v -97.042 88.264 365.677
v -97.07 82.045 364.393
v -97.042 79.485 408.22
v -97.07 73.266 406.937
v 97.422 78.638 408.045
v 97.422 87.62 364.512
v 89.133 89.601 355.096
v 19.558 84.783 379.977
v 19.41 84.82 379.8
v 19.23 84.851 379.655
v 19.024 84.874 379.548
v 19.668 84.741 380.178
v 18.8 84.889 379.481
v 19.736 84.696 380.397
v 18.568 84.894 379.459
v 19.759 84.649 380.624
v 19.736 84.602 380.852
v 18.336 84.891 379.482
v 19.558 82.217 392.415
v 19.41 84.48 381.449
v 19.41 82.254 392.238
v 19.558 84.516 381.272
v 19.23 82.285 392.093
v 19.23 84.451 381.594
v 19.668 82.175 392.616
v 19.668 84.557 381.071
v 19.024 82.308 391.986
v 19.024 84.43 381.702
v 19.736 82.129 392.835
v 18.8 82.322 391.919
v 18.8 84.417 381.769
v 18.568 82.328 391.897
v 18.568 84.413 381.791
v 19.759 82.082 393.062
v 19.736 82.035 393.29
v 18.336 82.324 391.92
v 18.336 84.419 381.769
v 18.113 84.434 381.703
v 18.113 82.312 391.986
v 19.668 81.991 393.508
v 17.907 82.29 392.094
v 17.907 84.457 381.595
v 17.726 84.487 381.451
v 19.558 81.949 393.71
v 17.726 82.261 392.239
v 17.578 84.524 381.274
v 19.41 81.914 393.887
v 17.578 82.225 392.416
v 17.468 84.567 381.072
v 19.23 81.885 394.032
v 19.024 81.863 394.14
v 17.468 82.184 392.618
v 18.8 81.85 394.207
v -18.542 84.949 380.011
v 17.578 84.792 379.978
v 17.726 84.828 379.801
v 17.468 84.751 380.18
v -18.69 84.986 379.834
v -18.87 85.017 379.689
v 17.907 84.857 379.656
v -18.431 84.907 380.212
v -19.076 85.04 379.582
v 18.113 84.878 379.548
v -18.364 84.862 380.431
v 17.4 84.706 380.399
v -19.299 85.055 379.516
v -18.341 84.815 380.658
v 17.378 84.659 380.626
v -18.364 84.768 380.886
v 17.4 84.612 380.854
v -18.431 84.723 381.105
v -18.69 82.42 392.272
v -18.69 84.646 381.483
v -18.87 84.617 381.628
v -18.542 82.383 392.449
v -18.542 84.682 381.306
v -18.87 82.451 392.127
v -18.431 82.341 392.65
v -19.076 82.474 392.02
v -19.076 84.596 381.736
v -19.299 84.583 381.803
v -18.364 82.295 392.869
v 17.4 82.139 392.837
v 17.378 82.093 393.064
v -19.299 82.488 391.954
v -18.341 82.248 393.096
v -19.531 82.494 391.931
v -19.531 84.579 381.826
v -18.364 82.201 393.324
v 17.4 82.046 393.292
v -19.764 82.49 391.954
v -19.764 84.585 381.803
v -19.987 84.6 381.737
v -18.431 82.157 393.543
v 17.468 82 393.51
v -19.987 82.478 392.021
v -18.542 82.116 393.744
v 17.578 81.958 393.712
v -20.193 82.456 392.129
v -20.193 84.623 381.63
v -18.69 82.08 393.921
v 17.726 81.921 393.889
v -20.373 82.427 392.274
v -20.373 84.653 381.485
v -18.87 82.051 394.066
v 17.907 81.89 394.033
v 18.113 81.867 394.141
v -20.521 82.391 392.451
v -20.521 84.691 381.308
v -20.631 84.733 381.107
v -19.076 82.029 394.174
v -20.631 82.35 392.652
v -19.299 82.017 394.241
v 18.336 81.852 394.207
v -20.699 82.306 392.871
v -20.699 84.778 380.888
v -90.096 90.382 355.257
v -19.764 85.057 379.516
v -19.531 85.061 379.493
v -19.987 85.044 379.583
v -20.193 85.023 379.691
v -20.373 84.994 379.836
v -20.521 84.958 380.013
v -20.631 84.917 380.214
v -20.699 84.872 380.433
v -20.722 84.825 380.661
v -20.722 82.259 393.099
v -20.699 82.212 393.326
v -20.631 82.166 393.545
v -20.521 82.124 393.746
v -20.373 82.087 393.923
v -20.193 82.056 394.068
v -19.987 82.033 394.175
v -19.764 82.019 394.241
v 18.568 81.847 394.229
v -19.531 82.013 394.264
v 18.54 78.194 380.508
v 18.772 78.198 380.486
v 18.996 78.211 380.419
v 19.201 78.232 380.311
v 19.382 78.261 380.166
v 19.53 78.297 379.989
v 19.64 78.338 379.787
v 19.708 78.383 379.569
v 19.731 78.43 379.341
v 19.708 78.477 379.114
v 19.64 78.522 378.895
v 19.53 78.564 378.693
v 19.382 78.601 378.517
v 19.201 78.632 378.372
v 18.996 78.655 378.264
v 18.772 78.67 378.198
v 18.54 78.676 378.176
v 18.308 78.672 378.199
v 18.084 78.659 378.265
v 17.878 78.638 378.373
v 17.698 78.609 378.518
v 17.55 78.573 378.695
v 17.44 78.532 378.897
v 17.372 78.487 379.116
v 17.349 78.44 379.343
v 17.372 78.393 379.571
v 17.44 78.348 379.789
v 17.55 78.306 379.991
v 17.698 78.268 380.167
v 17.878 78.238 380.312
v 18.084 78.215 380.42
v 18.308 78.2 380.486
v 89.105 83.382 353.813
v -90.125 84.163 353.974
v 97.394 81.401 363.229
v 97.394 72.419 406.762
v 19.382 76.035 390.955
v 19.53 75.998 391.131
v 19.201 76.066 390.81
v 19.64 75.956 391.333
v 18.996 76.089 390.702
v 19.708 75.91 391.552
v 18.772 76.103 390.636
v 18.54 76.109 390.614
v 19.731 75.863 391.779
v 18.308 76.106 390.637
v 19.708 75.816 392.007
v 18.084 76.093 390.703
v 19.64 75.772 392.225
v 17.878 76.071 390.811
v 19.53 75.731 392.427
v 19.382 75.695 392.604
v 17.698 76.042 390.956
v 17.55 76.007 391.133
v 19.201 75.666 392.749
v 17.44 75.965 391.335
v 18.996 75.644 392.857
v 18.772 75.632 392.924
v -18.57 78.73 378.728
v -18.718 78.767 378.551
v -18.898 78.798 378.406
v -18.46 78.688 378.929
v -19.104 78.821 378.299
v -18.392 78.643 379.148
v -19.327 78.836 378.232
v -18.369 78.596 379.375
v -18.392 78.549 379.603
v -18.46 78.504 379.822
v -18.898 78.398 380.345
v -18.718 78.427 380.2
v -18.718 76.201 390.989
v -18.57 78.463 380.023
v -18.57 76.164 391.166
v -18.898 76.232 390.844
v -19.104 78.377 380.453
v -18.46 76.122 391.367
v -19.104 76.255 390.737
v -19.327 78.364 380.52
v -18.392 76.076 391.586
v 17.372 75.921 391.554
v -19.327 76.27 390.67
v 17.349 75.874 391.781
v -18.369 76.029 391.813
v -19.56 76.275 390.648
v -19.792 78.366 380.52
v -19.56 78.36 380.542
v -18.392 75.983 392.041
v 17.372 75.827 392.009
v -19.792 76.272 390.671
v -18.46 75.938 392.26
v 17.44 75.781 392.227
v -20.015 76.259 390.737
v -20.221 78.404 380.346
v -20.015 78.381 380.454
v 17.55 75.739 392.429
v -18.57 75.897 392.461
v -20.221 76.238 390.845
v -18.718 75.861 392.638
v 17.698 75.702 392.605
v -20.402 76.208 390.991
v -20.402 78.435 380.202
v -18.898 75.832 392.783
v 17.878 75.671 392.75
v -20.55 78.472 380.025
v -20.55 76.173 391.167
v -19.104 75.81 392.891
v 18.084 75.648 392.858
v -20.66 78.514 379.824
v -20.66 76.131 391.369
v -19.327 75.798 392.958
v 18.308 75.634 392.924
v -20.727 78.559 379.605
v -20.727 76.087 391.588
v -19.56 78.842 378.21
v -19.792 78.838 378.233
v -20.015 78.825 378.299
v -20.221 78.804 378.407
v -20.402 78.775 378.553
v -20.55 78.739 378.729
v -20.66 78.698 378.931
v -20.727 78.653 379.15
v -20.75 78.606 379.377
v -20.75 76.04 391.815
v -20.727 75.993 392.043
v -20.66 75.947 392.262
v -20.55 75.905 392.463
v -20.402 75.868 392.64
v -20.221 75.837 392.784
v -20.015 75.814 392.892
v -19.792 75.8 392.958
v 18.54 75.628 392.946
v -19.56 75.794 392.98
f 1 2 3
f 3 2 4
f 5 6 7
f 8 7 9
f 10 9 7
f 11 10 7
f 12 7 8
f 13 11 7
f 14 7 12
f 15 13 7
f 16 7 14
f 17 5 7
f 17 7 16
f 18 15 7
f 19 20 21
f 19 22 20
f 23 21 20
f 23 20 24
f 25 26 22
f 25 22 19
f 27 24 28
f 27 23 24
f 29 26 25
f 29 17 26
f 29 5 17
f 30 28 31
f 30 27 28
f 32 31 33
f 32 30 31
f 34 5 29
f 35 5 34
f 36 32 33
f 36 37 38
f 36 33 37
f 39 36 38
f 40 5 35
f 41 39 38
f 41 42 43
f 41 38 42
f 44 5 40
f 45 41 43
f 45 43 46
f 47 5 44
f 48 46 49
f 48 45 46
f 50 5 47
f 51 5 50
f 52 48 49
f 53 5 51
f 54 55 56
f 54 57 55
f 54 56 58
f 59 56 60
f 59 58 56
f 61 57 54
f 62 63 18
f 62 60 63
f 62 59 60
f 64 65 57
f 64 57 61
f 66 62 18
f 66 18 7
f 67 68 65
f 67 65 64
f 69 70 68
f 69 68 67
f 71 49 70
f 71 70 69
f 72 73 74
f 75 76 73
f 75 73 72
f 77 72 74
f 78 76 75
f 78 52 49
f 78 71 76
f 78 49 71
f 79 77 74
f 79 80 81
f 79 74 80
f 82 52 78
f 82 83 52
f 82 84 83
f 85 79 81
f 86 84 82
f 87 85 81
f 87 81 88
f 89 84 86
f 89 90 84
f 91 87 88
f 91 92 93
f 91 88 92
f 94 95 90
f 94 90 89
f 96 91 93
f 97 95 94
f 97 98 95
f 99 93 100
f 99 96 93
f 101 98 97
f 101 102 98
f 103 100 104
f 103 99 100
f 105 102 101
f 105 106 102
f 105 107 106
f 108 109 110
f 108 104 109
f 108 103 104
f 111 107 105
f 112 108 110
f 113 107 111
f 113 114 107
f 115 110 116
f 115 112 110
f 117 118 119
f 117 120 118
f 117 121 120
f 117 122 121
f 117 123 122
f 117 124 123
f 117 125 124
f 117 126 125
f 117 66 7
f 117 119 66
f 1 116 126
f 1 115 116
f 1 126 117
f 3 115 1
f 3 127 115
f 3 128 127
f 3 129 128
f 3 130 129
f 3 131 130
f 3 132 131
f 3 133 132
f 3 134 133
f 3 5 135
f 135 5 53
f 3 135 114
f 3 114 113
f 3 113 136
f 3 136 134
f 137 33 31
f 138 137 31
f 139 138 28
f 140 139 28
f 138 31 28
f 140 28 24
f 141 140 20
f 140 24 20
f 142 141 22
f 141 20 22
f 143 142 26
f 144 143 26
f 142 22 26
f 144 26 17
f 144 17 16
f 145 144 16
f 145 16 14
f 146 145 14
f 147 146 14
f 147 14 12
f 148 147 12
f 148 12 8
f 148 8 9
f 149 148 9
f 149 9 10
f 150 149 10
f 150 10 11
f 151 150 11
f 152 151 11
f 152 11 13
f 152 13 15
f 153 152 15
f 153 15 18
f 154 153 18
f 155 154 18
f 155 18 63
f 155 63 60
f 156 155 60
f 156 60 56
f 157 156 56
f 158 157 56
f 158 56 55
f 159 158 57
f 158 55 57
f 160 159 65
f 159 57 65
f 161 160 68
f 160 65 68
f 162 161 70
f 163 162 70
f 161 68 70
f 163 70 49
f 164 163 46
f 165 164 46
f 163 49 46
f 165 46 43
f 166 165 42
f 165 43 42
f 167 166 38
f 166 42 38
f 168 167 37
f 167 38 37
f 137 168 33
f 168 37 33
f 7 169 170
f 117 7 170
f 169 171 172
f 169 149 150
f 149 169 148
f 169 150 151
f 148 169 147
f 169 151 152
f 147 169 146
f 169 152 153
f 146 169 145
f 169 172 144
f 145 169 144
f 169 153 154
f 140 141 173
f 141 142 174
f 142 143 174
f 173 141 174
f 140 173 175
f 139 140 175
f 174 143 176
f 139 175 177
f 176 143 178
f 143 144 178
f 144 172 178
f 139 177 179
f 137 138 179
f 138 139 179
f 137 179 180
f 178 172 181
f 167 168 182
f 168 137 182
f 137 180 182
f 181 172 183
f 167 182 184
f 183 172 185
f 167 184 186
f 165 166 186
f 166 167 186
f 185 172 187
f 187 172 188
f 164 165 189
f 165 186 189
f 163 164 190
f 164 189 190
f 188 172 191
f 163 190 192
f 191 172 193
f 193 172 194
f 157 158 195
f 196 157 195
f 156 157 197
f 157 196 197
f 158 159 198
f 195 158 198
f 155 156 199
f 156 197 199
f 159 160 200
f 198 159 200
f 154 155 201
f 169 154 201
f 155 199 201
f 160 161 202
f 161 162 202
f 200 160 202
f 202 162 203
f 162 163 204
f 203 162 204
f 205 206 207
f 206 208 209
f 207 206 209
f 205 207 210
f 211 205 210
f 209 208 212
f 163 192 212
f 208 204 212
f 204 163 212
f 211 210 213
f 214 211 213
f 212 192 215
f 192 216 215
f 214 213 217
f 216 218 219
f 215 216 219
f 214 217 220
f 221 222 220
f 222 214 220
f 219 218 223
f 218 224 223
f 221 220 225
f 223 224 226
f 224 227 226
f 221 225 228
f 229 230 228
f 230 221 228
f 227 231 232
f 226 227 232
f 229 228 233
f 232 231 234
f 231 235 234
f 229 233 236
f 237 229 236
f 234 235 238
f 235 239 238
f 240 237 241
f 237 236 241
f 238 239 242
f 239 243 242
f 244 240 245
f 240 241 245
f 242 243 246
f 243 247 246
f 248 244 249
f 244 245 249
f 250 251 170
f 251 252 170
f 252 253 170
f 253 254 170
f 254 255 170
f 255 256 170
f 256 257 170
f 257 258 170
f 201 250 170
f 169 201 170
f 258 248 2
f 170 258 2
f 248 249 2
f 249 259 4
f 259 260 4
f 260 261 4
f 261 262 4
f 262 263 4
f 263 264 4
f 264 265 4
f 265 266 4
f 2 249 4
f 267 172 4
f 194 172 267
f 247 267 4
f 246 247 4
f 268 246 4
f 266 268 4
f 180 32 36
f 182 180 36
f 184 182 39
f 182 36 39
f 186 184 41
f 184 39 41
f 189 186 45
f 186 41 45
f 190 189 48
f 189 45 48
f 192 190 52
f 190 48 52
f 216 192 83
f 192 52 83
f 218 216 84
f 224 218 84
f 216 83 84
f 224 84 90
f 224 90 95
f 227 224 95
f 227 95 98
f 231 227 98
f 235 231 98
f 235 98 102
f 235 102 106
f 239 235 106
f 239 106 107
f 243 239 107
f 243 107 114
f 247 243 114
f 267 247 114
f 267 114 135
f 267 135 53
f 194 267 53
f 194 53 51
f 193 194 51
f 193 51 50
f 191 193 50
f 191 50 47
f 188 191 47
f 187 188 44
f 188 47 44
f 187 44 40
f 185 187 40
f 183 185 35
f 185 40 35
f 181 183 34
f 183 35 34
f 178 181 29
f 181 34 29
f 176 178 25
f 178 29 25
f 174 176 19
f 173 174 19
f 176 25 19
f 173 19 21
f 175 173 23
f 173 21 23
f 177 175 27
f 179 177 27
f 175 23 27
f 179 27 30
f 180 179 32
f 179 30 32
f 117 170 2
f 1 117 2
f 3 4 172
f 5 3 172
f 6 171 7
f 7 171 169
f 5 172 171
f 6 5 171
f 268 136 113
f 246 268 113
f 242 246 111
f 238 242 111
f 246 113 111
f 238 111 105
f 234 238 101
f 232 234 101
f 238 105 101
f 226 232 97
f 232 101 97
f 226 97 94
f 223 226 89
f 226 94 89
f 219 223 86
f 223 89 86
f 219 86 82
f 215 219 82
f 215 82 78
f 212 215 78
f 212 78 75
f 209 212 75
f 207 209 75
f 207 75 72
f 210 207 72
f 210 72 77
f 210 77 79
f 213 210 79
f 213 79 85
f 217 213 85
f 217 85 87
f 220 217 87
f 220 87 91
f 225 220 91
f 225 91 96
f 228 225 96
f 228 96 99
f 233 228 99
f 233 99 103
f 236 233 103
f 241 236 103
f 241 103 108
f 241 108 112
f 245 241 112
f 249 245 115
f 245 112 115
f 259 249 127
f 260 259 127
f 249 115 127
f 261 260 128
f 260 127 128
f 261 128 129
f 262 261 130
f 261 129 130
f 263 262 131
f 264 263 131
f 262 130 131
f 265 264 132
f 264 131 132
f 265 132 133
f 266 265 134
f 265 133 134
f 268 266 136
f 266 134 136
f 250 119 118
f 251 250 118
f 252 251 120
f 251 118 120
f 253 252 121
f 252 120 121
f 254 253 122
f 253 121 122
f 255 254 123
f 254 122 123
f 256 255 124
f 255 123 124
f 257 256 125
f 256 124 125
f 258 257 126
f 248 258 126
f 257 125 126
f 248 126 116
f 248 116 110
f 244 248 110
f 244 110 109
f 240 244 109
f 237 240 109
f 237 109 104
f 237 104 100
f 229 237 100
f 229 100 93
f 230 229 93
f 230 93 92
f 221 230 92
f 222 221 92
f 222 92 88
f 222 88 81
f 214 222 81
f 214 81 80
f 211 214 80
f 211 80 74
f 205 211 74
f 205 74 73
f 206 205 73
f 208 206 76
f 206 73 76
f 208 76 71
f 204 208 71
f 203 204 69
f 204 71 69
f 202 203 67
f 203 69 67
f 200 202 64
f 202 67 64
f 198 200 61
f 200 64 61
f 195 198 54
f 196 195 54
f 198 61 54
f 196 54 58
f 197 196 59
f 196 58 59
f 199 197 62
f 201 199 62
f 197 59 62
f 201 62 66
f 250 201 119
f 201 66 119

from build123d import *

# Parameters (mm, degrees)
BOSS_EXTRUDE1_DEPTH = 6.35
SKETCH4_R           = 1.190625
CUT_EXTRUDE2_DEPTH  = 398.434844364


with BuildPart() as part:
    # Sketch2 → Boss-Extrude1 (new body)
    with BuildSketch(Plane(origin=(0.683346332, 150.385179261, 31.029771586), x_dir=(-0.9999900978792948, 0.004358374370466655, 0.0008992864979534574), z_dir=(0.004450184643196504, 0.979359636230067, 0.20207646765507412))):
        Polygon((-88.422343932, 329.663853712), (90.808907549, 329.663853712), (97.754590844, 340.296232729), (97.754590844, 383.735739743), (-96.711451797, 383.735739743), (-96.711451797, 339.285739743), align=None)
    extrude(amount=BOSS_EXTRUDE1_DEPTH)

    # Sketch4 → Cut-Extrude2 (cut, through all)
    with BuildSketch(Plane(origin=(0.711605005, 156.604112951, 32.312957155), x_dir=(0.9999900978792948, -0.0043583743704666555, -0.0008992864979534572), z_dir=(0.004450184643196505, 0.9793596362300672, 0.2020764676550741))):
        with Locations((17.856718191, -355.665986236)):
            Circle(SKETCH4_R)
        with Locations((17.856718191, -368.365986236)):
            Circle(SKETCH4_R)
        with Locations((-20.243281809, -368.365986236)):
            Circle(SKETCH4_R)
        with Locations((-20.243281809, -355.665986236)):
            Circle(SKETCH4_R)
    extrude(amount=-CUT_EXTRUDE2_DEPTH, mode=Mode.SUBTRACT)


solid = part.part
